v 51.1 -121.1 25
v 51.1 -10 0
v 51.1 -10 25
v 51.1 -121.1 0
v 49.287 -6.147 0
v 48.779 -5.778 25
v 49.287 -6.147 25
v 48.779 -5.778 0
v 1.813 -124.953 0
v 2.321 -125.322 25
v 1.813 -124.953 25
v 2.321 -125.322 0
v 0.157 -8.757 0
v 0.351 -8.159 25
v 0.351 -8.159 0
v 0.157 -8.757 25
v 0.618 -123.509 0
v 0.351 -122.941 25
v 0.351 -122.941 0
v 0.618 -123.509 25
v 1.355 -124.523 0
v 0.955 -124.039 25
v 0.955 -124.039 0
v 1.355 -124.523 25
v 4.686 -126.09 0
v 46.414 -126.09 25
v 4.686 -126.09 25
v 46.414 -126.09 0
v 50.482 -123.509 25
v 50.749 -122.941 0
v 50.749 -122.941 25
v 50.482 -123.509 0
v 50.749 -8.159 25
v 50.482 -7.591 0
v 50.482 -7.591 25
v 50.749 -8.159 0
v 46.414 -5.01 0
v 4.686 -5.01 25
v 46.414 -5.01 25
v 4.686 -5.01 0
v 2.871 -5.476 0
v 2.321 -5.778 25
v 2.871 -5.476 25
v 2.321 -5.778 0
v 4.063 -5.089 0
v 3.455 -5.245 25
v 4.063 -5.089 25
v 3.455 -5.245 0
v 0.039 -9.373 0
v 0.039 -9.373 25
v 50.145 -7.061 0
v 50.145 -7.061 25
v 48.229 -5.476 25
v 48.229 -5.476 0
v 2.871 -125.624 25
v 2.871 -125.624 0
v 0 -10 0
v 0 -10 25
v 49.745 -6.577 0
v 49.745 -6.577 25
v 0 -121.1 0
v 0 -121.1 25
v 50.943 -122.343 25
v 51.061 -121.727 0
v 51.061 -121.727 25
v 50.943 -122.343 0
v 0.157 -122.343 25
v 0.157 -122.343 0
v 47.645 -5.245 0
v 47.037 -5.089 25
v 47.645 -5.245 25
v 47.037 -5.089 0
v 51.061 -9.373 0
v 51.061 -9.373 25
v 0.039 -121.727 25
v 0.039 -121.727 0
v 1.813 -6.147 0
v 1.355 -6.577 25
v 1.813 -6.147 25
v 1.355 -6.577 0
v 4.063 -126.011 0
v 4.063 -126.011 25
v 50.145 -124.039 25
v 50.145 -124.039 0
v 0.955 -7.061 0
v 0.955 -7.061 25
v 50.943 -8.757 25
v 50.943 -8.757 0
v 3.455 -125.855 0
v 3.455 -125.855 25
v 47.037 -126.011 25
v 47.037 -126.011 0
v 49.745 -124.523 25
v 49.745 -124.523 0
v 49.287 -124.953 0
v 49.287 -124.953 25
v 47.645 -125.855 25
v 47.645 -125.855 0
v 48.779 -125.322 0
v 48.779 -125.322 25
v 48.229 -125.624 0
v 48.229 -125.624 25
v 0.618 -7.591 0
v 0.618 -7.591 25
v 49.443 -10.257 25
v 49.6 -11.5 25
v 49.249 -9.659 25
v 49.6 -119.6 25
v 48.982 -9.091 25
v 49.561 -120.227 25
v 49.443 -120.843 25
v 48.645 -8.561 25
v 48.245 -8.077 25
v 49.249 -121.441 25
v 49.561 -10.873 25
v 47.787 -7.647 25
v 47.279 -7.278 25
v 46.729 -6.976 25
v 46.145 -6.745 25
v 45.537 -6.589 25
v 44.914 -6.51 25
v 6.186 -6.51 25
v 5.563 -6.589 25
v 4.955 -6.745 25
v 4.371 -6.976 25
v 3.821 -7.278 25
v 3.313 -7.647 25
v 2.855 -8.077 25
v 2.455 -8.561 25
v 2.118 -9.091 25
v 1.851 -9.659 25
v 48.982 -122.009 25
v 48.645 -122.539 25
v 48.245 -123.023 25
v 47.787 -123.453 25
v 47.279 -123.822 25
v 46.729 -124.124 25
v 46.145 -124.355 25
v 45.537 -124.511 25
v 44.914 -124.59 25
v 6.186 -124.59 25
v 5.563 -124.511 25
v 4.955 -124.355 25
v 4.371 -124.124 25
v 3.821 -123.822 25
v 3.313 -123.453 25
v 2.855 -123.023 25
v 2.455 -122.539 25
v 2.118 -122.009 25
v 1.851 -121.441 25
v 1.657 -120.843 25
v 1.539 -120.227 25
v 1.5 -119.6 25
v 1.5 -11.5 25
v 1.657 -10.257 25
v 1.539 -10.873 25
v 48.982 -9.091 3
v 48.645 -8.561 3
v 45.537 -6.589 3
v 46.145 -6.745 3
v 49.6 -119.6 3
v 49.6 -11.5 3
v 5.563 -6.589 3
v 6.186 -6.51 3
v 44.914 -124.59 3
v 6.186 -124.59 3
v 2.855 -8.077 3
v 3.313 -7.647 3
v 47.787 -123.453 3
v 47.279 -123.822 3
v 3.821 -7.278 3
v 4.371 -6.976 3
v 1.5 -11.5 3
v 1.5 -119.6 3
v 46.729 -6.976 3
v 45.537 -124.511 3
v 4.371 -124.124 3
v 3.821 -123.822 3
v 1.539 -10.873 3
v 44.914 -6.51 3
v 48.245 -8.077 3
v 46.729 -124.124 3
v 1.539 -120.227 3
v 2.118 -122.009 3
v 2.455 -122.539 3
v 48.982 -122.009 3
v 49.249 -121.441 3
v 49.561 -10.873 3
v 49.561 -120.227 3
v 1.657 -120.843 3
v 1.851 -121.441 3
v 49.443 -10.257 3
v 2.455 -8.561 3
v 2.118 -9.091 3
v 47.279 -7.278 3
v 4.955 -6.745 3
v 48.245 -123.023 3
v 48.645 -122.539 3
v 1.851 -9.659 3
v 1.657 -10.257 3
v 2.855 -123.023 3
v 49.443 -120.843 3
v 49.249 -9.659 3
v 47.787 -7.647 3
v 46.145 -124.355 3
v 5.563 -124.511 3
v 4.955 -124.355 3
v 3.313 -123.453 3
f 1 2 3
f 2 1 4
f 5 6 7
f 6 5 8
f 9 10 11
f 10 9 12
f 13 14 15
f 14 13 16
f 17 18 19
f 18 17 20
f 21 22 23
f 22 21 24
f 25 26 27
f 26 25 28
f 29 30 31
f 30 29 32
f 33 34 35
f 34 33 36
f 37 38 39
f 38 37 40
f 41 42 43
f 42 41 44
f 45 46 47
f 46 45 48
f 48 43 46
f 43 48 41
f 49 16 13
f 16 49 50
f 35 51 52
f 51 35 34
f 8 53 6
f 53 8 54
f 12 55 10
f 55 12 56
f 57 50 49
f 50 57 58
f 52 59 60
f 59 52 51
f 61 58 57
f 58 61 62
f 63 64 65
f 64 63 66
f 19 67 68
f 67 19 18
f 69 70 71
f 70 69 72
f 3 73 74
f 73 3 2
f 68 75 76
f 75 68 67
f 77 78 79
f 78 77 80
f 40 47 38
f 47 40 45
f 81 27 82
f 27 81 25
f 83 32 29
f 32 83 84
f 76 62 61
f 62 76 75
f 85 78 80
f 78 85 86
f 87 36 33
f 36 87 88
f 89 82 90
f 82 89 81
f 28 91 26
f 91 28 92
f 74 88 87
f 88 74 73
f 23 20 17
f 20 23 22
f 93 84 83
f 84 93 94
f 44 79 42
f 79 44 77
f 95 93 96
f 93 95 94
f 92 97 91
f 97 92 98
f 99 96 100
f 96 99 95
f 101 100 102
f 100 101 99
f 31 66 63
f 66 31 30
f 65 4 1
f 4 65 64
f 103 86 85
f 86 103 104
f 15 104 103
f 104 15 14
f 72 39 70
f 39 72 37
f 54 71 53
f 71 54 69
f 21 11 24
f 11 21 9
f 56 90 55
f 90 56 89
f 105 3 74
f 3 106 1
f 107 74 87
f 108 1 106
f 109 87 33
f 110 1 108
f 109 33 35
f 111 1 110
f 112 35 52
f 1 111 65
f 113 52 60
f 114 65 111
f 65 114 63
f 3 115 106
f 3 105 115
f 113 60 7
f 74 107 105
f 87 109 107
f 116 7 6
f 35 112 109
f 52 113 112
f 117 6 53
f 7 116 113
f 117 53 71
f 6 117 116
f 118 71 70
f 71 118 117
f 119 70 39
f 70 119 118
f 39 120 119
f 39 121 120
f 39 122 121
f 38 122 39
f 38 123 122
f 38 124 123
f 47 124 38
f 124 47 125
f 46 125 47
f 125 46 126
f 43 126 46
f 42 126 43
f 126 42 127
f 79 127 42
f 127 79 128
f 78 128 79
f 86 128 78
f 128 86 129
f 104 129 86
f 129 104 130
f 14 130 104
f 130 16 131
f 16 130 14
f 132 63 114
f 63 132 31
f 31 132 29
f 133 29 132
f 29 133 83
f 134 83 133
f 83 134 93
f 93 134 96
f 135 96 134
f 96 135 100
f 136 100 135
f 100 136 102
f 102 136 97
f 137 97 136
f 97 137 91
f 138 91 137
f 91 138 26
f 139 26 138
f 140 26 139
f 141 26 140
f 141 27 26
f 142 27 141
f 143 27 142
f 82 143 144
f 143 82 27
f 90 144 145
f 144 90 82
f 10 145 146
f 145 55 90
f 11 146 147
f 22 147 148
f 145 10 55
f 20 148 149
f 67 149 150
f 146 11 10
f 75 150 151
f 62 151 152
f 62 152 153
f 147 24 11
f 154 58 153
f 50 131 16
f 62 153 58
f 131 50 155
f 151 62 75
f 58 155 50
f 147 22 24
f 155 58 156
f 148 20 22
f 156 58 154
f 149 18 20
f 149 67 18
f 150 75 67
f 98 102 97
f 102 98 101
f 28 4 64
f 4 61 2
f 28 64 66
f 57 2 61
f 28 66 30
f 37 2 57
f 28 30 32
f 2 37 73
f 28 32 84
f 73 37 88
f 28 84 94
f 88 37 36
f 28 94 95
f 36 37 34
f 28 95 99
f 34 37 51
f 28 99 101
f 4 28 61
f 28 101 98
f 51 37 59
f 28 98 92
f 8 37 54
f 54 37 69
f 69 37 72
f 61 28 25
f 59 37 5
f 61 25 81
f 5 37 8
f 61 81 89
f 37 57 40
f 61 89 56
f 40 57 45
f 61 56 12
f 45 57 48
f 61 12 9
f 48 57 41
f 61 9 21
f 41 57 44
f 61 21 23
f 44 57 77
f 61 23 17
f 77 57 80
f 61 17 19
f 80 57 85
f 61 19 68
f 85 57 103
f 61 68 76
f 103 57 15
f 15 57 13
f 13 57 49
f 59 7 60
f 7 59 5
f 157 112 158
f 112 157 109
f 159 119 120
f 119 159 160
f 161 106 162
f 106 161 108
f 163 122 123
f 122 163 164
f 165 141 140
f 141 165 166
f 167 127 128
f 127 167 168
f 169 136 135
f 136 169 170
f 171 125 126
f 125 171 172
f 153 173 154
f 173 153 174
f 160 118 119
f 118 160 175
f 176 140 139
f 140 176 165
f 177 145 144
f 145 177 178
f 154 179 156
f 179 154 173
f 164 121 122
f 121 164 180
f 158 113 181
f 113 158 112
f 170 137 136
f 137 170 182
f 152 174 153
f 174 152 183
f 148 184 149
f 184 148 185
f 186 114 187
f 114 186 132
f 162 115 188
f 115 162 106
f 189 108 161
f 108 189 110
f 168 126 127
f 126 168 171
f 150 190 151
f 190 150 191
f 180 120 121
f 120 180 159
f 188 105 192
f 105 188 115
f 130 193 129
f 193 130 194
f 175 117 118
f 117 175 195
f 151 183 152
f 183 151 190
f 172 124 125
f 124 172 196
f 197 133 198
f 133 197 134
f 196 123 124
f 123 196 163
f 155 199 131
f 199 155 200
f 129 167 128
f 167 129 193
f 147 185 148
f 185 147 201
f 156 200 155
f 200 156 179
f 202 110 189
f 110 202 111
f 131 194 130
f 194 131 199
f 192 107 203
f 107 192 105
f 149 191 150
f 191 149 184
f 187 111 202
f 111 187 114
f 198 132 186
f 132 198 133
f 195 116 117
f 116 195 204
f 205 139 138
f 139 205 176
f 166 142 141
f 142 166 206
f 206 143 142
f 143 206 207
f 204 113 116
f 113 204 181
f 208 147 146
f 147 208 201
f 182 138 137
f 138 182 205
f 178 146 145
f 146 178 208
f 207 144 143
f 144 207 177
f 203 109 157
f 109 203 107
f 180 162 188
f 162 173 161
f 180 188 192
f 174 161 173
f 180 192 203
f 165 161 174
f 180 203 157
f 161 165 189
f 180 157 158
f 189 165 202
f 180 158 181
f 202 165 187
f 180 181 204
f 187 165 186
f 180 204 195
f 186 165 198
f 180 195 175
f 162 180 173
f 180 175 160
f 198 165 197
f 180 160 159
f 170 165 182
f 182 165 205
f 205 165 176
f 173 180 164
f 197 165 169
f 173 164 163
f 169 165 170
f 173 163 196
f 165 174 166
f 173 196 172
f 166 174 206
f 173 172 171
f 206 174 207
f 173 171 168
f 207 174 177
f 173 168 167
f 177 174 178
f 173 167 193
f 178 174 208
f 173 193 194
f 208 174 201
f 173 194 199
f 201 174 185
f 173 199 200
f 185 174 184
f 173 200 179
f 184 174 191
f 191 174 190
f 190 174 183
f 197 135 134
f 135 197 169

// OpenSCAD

/* [Configurations] */
Object_Height = 90;
Object_Width = 45;
Object_Depth = 115;
Wall_Thickness = 3;// 5mm is good enough
Cover_Height = 25;

/* [hidden] */
$fn = 50;
Tolerance = 0.1;
Cover_Spacing = 0.5;
Rounded_Corner = 5;


translate([0 ,-5 ,Cover_Height]) rotate([180,0,0])  tampa(0);

module caixa(){
    difference(){
    roundedcube(Object_Width + Tolerance + (Wall_Thickness * 2), Object_Depth + Tolerance + (Wall_Thickness * 2), Object_Height + Tolerance + Wall_Thickness, Rounded_Corner,Rounded_Corner,Rounded_Corner,Rounded_Corner);
    translate([Wall_Thickness, Wall_Thickness, Wall_Thickness]) cube([Object_Width + Tolerance, Object_Depth + Tolerance, Object_Height + Tolerance + 1]);
    // Recorte da tampa
    translate([0,-0,(Object_Height + 1) - Cover_Height + (Wall_Thickness * 2)]) tampa(Cover_Spacing);    
    }
    
}

module simbolo(rotation){
    union()
	{
		rotate([90,0,rotation]) resize([larguraLogo,alturaLogo,profundidadeLogo]) import("logo.stl");
	}
}

module tampa(folga){
    difference(){
    translate([-folga/2,-folga/2,0]) roundedcube(Object_Width + Tolerance + (Wall_Thickness * 2) + folga, Object_Depth + Tolerance + (Wall_Thickness * 2) + folga, Cover_Height, Rounded_Corner,Rounded_Corner,Rounded_Corner,Rounded_Corner);
    translate([(Wall_Thickness + folga)/2, (Wall_Thickness + folga) /2, -Wall_Thickness]) roundedcube(Object_Width + Tolerance + Wall_Thickness - folga, Object_Depth + Tolerance +Wall_Thickness - folga, Cover_Height , Rounded_Corner, Rounded_Corner, Rounded_Corner, Rounded_Corner);
    }
}

module cartas(){
#cube([Object_Width, Object_Depth, Object_Height]);
}

module roundedcube(xdim ,ydim ,zdim,rdim1, rdim2, rdim3, rdim4){
    hull(){
        translate([rdim1,rdim1,0]) cylinder(r=rdim1, h=zdim);
        translate([xdim-rdim2,rdim2,0]) cylinder(r=rdim2, h=zdim);

        translate([rdim3,ydim-rdim3,0]) cylinder(r=rdim3, h=zdim);
        translate([xdim-rdim4,ydim-rdim4,0]) cylinder(r=rdim4, h=zdim);
    }
}

